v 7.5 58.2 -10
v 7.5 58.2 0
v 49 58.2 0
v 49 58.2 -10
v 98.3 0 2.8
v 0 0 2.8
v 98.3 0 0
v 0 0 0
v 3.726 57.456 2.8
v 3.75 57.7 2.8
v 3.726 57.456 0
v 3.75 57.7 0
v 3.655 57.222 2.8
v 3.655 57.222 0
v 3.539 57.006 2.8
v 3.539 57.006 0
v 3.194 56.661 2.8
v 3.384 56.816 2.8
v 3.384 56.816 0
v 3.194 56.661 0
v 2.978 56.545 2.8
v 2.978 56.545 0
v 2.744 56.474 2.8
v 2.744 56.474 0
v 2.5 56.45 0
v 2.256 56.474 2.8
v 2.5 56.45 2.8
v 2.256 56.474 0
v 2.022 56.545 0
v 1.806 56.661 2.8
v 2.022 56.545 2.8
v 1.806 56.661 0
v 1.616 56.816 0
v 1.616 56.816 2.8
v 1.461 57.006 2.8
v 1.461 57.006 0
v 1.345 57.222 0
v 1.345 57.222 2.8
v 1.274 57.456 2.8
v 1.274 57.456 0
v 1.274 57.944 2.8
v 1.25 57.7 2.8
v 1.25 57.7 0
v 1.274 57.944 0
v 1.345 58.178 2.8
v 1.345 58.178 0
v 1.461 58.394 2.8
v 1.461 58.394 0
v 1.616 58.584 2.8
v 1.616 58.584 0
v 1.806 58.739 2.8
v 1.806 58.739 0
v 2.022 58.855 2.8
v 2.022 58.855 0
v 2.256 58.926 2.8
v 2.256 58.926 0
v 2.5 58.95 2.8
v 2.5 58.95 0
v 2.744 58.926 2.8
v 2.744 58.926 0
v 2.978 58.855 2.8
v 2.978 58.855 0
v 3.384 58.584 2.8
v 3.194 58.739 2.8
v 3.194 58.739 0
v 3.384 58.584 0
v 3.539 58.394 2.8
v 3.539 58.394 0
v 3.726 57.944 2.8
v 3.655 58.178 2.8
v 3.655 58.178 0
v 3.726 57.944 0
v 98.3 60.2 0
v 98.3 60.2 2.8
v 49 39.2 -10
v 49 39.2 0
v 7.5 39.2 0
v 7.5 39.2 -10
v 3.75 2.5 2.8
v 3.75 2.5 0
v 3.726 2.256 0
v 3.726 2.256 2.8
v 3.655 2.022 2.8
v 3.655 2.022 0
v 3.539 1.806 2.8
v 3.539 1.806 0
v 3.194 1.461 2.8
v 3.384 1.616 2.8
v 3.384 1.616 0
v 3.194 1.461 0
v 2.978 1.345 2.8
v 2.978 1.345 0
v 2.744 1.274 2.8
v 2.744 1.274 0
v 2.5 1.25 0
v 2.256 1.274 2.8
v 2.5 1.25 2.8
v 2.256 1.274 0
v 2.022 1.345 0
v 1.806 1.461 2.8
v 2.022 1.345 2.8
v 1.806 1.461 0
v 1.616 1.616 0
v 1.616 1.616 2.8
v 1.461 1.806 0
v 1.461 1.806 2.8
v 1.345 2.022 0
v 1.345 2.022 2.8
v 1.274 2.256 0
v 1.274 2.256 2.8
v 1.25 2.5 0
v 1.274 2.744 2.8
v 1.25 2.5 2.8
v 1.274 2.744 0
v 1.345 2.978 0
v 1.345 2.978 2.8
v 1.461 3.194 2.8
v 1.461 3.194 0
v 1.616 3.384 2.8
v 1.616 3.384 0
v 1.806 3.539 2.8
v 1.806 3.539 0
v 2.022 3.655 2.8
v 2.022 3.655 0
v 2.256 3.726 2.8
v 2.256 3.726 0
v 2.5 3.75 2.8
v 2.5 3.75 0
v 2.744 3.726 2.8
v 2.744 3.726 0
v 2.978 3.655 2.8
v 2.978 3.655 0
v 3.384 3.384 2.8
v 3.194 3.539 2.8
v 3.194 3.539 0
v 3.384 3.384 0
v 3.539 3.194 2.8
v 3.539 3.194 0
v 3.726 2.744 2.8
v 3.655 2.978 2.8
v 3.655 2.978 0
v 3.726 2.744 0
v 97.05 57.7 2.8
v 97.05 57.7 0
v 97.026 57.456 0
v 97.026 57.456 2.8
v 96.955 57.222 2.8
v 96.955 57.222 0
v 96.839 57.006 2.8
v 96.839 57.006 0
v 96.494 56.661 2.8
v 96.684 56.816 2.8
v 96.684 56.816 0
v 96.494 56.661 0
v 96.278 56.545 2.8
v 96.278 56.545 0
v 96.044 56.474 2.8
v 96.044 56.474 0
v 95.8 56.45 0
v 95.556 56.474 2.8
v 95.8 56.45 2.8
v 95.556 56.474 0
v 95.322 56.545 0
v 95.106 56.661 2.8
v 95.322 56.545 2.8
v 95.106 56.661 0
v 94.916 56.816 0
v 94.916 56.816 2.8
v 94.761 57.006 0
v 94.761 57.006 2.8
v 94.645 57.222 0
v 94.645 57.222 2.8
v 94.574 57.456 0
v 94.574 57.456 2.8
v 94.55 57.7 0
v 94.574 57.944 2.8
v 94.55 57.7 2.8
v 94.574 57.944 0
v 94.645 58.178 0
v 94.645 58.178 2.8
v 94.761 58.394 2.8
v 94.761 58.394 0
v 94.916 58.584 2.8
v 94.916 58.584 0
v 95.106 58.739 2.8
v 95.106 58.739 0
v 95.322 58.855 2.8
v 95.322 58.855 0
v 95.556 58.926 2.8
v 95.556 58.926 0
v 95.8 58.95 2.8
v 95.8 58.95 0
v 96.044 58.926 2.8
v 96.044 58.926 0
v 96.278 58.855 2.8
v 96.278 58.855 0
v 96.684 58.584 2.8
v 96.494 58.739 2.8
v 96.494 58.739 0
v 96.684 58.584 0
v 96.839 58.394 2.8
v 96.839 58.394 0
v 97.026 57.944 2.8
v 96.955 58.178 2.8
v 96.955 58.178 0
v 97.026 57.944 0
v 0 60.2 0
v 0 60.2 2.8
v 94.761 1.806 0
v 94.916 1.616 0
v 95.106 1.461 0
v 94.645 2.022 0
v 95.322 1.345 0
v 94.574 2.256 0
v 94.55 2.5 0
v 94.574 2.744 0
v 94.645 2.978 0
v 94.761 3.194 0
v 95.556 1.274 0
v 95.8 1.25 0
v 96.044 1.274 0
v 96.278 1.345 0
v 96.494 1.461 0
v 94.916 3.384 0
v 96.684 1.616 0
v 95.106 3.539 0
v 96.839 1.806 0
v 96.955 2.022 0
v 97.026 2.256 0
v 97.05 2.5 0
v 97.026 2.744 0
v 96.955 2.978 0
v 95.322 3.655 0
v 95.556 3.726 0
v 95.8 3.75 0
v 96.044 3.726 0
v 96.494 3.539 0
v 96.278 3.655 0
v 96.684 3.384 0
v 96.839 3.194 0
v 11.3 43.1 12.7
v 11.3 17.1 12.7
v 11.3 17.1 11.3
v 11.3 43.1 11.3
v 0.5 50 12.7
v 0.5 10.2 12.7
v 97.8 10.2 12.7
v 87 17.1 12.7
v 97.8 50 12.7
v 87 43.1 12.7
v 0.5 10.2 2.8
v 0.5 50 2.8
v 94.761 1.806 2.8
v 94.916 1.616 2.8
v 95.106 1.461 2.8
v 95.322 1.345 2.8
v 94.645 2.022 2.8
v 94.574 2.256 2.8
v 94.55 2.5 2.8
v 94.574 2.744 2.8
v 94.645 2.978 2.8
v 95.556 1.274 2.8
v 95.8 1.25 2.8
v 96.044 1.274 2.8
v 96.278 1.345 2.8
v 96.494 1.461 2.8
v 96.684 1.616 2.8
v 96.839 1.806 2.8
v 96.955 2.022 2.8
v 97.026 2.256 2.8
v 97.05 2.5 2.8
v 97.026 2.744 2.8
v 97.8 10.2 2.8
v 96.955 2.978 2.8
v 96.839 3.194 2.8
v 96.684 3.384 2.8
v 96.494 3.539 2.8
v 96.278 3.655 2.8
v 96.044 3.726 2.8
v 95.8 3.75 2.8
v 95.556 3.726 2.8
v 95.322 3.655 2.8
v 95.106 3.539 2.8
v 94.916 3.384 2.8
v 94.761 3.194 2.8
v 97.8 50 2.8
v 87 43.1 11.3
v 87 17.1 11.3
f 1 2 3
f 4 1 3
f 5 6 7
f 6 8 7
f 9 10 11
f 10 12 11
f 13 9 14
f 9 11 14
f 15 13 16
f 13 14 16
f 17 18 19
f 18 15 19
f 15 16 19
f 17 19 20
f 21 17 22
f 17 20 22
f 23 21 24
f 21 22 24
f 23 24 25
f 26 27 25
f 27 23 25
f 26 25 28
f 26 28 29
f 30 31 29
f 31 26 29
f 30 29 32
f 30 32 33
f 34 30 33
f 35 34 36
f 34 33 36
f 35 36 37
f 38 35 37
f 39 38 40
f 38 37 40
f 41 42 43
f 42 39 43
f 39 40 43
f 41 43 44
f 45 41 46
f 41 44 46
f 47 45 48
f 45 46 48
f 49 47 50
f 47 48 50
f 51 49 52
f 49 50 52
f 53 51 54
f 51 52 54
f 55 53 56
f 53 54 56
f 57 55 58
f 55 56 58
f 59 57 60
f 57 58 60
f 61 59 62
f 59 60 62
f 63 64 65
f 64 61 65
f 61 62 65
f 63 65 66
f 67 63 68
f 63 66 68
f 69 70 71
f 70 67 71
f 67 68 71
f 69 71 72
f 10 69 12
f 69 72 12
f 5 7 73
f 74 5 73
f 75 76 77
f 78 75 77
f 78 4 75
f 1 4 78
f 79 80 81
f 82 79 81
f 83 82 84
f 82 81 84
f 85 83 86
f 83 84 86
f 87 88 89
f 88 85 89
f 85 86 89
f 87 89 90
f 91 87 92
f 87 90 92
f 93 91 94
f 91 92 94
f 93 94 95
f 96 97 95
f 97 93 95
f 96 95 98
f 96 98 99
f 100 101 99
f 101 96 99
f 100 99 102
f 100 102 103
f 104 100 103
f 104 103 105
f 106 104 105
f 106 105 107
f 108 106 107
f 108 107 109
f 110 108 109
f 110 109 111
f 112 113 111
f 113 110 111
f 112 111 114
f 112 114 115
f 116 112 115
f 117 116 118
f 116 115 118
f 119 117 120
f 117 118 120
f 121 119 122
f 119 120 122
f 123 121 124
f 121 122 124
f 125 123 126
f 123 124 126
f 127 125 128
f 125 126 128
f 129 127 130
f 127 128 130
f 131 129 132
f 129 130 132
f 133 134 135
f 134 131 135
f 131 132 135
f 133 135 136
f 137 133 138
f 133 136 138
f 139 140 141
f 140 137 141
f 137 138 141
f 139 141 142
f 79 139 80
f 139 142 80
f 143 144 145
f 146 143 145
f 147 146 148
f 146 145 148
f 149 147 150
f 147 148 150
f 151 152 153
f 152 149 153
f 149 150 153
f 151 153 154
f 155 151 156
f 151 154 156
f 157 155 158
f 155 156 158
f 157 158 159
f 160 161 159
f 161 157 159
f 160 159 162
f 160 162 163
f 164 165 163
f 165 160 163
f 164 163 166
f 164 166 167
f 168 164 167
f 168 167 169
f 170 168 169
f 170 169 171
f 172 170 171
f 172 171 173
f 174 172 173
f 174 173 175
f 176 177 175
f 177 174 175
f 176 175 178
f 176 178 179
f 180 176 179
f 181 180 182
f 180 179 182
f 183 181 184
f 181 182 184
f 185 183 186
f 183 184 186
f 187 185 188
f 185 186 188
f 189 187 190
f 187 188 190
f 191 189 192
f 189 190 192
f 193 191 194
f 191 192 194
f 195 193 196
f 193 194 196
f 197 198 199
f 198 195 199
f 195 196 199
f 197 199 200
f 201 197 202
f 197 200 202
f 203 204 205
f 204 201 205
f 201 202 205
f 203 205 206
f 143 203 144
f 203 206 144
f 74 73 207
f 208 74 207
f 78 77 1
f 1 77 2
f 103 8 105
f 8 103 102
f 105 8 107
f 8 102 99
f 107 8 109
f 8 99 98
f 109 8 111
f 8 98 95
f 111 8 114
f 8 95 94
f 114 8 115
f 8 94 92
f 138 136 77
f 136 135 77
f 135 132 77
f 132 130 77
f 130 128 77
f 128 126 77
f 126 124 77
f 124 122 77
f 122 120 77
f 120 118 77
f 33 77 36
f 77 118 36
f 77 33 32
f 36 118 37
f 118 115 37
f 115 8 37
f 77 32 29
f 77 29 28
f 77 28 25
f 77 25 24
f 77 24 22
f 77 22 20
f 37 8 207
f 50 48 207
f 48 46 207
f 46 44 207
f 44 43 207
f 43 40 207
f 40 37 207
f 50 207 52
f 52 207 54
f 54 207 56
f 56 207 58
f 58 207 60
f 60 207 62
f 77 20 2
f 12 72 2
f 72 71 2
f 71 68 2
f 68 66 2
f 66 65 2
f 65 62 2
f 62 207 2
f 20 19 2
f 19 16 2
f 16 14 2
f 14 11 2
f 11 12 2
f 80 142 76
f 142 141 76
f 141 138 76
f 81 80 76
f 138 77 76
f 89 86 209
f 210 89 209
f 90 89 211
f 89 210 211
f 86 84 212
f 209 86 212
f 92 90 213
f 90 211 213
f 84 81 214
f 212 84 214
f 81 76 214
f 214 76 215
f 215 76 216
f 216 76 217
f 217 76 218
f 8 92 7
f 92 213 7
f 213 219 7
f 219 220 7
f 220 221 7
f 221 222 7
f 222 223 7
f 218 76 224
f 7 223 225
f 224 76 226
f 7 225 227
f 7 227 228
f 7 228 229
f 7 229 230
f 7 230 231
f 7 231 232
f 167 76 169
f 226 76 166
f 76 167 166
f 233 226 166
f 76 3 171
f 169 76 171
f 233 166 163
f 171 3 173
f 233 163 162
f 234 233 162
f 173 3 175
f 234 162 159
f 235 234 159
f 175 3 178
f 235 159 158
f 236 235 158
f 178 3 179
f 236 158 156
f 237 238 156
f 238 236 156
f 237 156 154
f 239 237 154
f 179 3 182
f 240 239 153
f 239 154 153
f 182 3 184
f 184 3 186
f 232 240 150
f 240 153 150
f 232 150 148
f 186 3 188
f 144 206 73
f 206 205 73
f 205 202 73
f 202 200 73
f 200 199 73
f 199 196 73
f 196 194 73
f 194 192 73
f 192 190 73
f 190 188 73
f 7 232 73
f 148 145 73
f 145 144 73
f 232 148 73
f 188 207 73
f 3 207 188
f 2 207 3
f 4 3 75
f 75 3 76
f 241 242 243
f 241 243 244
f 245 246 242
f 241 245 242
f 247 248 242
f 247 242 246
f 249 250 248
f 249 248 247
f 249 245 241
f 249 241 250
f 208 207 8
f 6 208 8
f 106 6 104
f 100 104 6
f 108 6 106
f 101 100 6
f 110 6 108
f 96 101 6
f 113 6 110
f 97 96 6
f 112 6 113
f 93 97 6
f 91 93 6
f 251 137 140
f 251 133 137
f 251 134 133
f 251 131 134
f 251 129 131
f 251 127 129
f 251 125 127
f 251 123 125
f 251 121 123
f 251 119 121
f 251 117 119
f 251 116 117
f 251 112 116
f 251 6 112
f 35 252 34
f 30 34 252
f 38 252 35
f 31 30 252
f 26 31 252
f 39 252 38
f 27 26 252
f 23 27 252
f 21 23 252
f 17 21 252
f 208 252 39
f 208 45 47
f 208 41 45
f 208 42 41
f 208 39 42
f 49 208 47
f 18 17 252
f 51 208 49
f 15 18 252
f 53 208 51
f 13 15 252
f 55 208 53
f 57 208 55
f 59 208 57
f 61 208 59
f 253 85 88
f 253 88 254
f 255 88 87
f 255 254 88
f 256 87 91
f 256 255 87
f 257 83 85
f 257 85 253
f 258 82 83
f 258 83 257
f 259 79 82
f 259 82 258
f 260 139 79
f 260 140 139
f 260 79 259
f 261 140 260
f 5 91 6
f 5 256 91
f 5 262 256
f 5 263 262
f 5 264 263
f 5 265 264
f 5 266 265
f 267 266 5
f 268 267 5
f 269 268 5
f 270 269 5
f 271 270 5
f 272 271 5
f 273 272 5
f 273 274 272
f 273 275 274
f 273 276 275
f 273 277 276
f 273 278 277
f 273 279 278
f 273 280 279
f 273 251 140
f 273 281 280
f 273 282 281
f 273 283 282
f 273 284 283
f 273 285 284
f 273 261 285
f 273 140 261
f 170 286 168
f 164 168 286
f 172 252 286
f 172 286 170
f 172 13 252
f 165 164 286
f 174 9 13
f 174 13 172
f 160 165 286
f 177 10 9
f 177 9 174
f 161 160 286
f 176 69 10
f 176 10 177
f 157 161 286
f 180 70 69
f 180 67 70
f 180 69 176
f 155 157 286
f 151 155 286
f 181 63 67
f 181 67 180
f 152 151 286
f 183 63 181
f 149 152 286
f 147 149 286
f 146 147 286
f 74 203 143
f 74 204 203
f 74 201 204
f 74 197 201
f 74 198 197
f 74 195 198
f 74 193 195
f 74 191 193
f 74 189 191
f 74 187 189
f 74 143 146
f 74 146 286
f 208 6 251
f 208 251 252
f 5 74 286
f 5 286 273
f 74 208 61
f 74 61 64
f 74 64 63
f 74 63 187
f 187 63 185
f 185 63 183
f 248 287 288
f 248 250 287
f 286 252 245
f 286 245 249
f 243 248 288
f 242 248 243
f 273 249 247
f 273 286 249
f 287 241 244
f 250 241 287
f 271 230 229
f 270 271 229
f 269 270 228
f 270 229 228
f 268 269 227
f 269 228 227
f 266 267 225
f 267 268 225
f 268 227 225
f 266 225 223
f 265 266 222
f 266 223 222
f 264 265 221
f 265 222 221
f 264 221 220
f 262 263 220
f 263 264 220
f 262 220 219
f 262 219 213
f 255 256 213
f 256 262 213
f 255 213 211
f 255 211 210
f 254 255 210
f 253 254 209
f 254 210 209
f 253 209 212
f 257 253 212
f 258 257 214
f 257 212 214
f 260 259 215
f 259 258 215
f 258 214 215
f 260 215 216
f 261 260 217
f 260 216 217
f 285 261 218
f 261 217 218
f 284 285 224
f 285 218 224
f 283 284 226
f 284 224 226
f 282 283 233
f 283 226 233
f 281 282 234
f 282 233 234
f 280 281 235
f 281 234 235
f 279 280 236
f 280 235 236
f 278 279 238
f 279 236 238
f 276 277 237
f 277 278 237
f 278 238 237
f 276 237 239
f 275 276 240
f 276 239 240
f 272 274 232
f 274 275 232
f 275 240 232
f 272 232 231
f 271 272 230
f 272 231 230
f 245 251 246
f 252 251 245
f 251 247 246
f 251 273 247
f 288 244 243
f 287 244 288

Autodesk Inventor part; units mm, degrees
ref_plane "YZ Plane" through (0, 0, 0) normal (1, 0, 0) x (0, 1, 0)
ref_plane "XZ Plane" through (0, 0, 0) normal (0, 1, 0) x (-1, 0, 0)
ref_plane "XY Plane" through (0, 0, 0) normal (0, 0, 1) x (1, 0, 0)
sketch "Sketch1" plane through (0, 0, 0) normal (0, 0, 1) x (1, 0, 0)
  line L0 (0, 0) -> (98.3, 0)
  line L1 (98.3, 0) -> (98.3, 60.2)
  line L2 (98.3, 60.2) -> (0, 60.2)
  line L3 (0, 60.2) -> (0, 0)
  line L4 (0, 60.2) -> (2.5, 60.2) construction
  line L5 (2.5, 60.2) -> (2.5, 57.7) construction
  line L6 (2.5, 57.7) -> (0, 57.7) construction
  line L7 (0, 57.7) -> (0, 60.2) construction
  circle A0 centre (2.5, 57.7) radius 1.25
  line L8 (49.15, 60.2) -> (49.15, 0) construction
  line L9 (0, 30.1) -> (98.3, 30.1) construction
  circle A1 centre (95.8, 57.7) radius 1.25
  circle A2 centre (2.5, 2.5) radius 1.25
  circle A3 centre (95.8, 2.5) radius 1.25
  dimension "d0" = 98.3
  dimension "d1" = 60.2
  dimension "d2" = 2.5
  dimension "d7" = 2.5
  dimension "d8" = 2.5
extrude "LcdPcb" add sketch "Sketch1" along normal blind 2.8
sketch "Sketch2" plane through (0, 0, 2.8) normal (0, 0, 1) x (1, 0, 0)
  line L0 (98.3, 60.2) -> (0, 60.2) construction
  line L1 (49.15, 60.2) -> (49.15, 0) construction
  line L2 (0, 0) -> (98.3, 0) construction
  line L3 (0, 60.2) -> (0, 0) construction
  line L4 (0, 30.1) -> (98.3, 30.1) construction
  line L5 (98.3, 0) -> (98.3, 60.2) construction
  line L6 (0.5, 50) -> (97.8, 50)
  line L7 (97.8, 50) -> (97.8, 10.2)
  line L8 (97.8, 10.2) -> (0.5, 10.2)
  line L9 (0.5, 10.2) -> (0.5, 50)
  line L10 (0.5, 50) -> (97.8, 10.2) construction
  line L11 (97.8, 50) -> (0.5, 10.2) construction
  point P0 (49.15, 30.1)
  dimension "d15" = 39.8
  dimension "d16" = 97.3
extrude "LcdBezel" add sketch "Sketch2" along normal blind 9.9
sketch "Sketch3" plane through (0, 0, 12.7) normal (0, 0, 1) x (1, 0, 0)
  line L0 (0.5, 50) -> (0.5, 10.2) construction
  line L1 (0.5, 50) -> (11.3, 50) construction
  line L2 (11.3, 50) -> (11.3, 43.1) construction
  line L3 (11.3, 43.1) -> (0.5, 43.1) construction
  line L4 (0.5, 43.1) -> (0.5, 50) construction
  line L5 (11.3, 43.1) -> (87, 43.1)
  line L6 (87, 43.1) -> (87, 17.1)
  line L7 (87, 17.1) -> (11.3, 17.1)
  line L8 (11.3, 17.1) -> (11.3, 43.1)
  point P0 (0, 0)
  dimension "LcdBezelHeight" = 6.9
  dimension "LcdBezelLength" = 10.8
  dimension "d28" = 75.7
  dimension "d29" = 26
extrude "Lcd" cut sketch "Sketch3" against normal blind 1.4
sketch "Sketch4" plane through (0, 0, 0) normal (0, 0, -1) x (-1, 0, 0)
  line L0 (0, 60.2) -> (0, 0) construction
  line L1 (0, 60.2) -> (-7.5, 60.2) construction
  line L2 (-7.5, 60.2) -> (-7.5, 58.2) construction
  line L3 (-7.5, 58.2) -> (0, 58.2) construction
  line L4 (0, 58.2) -> (0, 60.2) construction
  line L5 (-7.5, 58.2) -> (-49, 58.2)
  line L6 (-49, 58.2) -> (-49, 39.2)
  line L7 (-49, 39.2) -> (-7.5, 39.2)
  line L8 (-7.5, 39.2) -> (-7.5, 58.2)
  dimension "LcdRearKeepOutHeightOffset" = 2
  dimension "LcdRearKeepOutLengthOffset" = 7.5
  dimension "LcdRearKeepOutHeight" = 19
  dimension "LcdRearKeepOutLength" = 41.5
extrude "LcdRearKeepOut" add sketch "Sketch4" along normal blind 10
equation "\"d0\" = LcdBorderLength"
equation "\"d1\" = LcdBorderHeight"
equation "\"d2\" = LcdFrameHoleOffset"
equation "\"d7\" = LcdFrameHoleOffset"
equation "\"d8\" = LcdFrameHoleDiameterUntapped"
equation "\"d12\" = LcdPcbThickness"
equation "\"d15\" = LcdHeight"
equation "\"d16\" = LcdLength"
equation "\"d28\" = LcdLength - 2 * LcdBezelLength"
equation "\"d29\" = LcdHeight - 2 * LcdBezelHeight"
equation "\"d30\" = 0.5 * LcdPcbThickness"
properties part number "2020-04-12 LcdAssembly"
